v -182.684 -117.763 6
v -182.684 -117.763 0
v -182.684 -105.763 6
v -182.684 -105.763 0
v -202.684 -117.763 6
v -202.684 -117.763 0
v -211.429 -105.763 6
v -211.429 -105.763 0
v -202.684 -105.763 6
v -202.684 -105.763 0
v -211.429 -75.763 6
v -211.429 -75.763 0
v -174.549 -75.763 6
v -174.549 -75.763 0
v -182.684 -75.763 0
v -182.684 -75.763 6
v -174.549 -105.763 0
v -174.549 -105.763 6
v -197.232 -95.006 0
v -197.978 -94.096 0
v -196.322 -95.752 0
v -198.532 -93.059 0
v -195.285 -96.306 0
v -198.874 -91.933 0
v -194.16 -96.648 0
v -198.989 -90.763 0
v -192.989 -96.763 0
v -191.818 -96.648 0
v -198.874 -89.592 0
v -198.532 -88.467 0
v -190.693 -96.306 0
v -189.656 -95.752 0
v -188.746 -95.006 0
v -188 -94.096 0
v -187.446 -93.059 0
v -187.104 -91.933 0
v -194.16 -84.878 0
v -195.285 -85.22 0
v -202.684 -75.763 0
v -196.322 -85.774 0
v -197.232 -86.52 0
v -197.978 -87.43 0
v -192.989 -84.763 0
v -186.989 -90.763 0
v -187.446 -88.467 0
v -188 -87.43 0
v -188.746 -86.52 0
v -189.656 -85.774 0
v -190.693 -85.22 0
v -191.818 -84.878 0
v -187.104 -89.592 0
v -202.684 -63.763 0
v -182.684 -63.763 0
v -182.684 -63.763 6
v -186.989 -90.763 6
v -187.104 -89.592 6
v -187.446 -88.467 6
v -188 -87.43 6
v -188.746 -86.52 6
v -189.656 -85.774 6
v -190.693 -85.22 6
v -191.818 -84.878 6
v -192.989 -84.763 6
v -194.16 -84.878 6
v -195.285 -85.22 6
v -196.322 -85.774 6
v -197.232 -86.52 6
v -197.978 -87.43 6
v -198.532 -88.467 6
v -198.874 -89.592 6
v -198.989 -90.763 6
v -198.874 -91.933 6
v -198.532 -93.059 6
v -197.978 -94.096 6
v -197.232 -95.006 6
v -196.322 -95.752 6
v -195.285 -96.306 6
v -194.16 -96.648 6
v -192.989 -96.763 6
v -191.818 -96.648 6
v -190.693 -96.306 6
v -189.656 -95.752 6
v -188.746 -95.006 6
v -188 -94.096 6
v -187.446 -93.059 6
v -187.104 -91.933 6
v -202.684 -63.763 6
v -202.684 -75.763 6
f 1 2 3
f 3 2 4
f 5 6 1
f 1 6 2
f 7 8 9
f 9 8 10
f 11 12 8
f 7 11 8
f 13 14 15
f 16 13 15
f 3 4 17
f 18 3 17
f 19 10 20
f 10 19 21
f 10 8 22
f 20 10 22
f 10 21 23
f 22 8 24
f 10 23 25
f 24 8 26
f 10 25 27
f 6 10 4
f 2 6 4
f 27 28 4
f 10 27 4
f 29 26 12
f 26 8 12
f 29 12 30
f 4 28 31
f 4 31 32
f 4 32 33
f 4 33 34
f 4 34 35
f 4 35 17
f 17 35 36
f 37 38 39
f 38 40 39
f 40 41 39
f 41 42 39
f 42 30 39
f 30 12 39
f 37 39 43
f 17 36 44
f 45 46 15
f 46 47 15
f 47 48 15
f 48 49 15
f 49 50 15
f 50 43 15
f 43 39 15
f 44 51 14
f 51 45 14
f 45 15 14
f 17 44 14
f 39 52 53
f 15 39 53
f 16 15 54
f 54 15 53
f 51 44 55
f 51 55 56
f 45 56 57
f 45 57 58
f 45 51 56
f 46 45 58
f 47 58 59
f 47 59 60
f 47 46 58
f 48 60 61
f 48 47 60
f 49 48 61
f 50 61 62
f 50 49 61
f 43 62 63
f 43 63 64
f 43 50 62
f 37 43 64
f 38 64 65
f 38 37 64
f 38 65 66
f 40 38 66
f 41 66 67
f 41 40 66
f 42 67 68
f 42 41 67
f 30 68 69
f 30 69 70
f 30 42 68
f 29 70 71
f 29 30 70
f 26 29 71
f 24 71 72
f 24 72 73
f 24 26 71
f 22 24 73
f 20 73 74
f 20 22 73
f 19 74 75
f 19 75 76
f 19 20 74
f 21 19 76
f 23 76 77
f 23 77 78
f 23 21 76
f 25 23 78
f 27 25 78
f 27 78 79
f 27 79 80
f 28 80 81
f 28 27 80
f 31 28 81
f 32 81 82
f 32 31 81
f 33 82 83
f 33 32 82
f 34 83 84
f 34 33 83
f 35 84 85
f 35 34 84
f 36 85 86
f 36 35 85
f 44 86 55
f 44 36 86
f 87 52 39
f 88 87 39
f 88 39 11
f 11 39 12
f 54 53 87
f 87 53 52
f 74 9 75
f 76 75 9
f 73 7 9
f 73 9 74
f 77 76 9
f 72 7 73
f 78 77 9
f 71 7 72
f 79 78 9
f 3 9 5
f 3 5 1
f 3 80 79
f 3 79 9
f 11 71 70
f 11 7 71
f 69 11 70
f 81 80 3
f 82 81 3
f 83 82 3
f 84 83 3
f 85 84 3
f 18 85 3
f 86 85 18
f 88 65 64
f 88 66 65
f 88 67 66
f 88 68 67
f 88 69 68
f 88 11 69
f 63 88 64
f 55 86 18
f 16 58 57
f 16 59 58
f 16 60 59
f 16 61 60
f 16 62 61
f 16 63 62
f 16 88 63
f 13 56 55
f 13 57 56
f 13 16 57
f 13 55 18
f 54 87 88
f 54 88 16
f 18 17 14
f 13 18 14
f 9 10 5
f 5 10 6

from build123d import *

# Parameters (mm, degrees)
SKETCH1_R           = 6
BOSS_EXTRUDE1_DEPTH = 6


with BuildPart() as part:
    # Sketch1 → Boss-Extrude1 (new body)
    with BuildSketch(Plane.XY):
        Polygon((-211.428617248, -75.762954902), (-211.428617248, -105.762954902), (-202.683627049, -105.762954902), (-202.683627049, -111.762954902), (-202.683627049, -117.762954902), (-182.683627049, -117.762954902), (-182.683627049, -111.762954902), (-182.683627049, -105.762954902), (-174.549373808, -105.762954902), (-174.549373808, -75.762954902), (-182.683627049, -75.762954902), (-182.683627049, -69.762954902), (-182.683627049, -63.762954902), (-202.683627049, -63.762954902), (-202.683627049, -69.762954902), (-202.683627049, -75.762954902), align=None)
        with Locations((-192.988995528, -90.762954902)):
            Circle(SKETCH1_R, mode=Mode.SUBTRACT)
    extrude(amount=BOSS_EXTRUDE1_DEPTH)


solid = part.part
